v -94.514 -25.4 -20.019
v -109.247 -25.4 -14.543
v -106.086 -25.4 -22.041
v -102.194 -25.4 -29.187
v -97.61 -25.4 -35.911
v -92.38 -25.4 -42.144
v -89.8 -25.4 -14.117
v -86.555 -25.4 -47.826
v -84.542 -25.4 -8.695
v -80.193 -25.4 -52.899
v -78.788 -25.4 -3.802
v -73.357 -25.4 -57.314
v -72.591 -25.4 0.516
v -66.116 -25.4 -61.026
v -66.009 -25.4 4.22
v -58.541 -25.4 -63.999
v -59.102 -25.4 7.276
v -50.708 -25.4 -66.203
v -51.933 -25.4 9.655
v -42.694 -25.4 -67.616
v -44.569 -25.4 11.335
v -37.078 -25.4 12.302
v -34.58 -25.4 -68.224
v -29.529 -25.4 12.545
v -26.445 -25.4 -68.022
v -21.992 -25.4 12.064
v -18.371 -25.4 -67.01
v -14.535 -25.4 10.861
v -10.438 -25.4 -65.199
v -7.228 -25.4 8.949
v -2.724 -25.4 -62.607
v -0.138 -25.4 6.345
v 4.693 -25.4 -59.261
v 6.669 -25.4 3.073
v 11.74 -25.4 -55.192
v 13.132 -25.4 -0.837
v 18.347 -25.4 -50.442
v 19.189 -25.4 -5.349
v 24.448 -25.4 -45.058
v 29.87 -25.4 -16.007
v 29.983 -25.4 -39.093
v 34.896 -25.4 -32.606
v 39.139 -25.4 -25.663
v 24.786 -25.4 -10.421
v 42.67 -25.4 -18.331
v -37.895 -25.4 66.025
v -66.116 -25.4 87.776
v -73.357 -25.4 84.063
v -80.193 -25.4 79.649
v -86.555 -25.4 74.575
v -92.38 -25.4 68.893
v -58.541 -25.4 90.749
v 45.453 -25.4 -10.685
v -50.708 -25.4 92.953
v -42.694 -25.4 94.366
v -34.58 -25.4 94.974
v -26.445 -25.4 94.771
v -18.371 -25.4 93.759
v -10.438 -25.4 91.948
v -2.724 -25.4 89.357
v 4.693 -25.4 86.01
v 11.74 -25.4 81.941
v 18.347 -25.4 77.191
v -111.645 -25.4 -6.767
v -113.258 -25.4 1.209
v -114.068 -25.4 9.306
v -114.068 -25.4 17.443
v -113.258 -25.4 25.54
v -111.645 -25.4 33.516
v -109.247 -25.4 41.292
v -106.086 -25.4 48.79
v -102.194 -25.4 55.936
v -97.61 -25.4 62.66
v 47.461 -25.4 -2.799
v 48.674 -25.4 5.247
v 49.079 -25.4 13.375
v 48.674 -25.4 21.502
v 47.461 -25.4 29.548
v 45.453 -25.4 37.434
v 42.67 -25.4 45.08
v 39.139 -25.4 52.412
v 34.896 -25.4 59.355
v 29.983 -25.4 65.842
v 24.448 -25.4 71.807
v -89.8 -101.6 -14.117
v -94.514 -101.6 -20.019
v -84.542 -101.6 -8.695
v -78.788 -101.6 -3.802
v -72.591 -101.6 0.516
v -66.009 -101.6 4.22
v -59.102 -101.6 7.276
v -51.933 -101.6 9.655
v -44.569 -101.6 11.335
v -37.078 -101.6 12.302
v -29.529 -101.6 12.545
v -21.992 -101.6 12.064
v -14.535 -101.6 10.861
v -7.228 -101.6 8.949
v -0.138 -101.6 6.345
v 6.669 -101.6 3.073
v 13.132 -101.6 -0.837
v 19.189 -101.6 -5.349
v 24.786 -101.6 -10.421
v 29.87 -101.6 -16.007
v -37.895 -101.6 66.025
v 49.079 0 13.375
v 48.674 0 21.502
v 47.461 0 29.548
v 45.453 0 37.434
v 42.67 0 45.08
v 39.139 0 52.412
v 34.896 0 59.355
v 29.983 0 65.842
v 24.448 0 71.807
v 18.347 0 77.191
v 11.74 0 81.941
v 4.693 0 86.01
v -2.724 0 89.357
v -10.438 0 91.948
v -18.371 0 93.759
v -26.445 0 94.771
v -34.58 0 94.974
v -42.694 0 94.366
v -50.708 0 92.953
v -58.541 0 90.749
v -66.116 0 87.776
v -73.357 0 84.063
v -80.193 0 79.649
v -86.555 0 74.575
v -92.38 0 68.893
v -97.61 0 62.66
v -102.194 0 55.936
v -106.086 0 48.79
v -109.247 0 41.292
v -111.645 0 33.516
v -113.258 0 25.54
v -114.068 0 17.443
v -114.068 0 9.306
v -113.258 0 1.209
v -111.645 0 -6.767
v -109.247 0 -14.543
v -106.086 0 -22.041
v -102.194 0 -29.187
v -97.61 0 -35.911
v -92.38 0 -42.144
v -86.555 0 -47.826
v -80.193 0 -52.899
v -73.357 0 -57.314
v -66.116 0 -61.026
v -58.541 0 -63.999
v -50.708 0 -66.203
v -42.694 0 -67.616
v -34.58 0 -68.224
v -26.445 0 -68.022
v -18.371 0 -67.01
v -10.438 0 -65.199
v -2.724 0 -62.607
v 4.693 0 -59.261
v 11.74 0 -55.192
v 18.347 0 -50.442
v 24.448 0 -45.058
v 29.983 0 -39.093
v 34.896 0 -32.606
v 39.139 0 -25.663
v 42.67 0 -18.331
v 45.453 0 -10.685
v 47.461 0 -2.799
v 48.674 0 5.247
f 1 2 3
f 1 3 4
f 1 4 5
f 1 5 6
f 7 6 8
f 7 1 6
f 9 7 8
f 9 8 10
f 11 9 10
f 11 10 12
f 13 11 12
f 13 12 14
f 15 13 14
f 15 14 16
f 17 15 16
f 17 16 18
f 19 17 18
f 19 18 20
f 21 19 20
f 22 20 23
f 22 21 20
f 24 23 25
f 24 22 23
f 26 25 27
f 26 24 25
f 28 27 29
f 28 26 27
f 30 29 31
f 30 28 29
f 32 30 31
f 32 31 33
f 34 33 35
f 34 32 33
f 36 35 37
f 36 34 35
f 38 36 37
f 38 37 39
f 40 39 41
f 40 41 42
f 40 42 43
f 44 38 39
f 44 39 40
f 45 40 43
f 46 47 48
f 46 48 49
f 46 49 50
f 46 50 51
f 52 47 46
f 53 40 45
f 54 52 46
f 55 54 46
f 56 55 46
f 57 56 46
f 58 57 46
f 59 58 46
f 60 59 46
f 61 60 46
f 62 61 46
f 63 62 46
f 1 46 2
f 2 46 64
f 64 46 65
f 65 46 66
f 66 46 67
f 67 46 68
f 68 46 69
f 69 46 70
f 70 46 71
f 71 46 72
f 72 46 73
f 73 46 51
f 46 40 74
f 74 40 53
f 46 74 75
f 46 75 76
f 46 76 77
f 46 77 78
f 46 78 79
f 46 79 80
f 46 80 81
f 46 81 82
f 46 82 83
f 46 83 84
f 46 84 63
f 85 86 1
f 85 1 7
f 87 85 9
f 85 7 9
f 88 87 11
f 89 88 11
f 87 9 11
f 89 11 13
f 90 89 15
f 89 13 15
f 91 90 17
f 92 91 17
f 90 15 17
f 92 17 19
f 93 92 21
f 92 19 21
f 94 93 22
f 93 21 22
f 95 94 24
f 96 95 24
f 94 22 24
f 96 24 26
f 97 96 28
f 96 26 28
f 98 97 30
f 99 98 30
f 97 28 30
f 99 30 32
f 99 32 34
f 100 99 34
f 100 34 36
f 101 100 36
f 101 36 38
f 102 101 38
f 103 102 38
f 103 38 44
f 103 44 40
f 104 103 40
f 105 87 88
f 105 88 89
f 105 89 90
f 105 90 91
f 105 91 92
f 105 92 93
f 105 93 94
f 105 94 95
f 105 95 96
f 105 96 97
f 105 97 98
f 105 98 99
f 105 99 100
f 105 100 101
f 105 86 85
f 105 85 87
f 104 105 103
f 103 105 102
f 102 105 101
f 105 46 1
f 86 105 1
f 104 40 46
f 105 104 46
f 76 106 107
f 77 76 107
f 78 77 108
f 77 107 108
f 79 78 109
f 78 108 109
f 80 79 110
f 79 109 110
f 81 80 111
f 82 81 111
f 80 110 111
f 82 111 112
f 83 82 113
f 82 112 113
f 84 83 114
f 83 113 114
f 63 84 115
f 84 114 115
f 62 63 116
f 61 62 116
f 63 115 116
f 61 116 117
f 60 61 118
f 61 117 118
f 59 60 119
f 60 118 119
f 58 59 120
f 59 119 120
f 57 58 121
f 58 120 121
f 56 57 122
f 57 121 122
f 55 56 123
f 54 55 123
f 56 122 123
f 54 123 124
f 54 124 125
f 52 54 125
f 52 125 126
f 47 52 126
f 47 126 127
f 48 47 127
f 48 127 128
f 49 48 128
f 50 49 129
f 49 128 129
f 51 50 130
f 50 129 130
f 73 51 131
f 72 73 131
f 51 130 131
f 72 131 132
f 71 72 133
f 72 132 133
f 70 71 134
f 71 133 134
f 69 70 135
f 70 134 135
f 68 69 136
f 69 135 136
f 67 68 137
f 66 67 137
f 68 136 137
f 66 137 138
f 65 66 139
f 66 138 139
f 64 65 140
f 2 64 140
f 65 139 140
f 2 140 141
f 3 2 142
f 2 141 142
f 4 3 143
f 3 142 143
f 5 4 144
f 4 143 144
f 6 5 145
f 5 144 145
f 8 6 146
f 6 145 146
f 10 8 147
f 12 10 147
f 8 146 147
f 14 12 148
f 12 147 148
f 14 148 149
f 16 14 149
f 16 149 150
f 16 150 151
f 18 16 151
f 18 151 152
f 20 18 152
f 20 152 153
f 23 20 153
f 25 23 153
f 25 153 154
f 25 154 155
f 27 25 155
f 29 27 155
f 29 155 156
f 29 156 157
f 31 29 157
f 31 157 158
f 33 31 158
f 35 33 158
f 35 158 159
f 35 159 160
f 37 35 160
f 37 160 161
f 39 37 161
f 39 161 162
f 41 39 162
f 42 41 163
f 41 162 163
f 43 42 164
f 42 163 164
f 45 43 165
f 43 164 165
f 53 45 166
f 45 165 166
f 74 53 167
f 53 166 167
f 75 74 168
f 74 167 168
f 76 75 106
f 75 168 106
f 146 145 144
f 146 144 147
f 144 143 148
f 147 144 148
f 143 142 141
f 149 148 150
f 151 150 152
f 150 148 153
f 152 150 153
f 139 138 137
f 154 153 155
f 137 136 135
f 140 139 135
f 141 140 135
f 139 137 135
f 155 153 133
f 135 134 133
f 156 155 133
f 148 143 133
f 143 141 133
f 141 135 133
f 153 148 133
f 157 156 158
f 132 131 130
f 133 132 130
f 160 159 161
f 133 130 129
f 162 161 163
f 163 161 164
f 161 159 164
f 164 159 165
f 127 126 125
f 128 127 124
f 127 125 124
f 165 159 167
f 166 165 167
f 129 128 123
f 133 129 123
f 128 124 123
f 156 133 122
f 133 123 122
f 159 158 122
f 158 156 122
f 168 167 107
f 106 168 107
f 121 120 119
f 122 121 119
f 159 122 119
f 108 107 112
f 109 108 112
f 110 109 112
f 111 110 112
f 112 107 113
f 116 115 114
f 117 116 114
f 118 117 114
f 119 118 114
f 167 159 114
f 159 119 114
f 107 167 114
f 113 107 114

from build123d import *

# Parameters (mm, degrees)
F0_R     = 81.624409
F1_DEPTH = 25.4
F3_DEPTH = 76.2


with BuildPart() as f1:
    # F0 (on Front) → F1 (new body)
    with BuildSketch(Plane.XZ):
        with Locations((-32.545008, 13.374658)):
            Circle(F0_R)
    extrude(amount=F1_DEPTH)

    # F2 (on face) → F3 (join)
    with BuildSketch(Plane.XZ.offset(25.4)):
        with BuildLine():
            Line((-37.894875, 66.024758), (-94.514281, -20.018902))
            ThreePointArc((-94.514281, -20.018902), (-33.306834, 12.514138), (29.870085, -16.006503))
            Line((29.870085, -16.006503), (-37.894875, 66.024758))
        make_face()
    extrude(amount=F3_DEPTH)


solid = f1.part
